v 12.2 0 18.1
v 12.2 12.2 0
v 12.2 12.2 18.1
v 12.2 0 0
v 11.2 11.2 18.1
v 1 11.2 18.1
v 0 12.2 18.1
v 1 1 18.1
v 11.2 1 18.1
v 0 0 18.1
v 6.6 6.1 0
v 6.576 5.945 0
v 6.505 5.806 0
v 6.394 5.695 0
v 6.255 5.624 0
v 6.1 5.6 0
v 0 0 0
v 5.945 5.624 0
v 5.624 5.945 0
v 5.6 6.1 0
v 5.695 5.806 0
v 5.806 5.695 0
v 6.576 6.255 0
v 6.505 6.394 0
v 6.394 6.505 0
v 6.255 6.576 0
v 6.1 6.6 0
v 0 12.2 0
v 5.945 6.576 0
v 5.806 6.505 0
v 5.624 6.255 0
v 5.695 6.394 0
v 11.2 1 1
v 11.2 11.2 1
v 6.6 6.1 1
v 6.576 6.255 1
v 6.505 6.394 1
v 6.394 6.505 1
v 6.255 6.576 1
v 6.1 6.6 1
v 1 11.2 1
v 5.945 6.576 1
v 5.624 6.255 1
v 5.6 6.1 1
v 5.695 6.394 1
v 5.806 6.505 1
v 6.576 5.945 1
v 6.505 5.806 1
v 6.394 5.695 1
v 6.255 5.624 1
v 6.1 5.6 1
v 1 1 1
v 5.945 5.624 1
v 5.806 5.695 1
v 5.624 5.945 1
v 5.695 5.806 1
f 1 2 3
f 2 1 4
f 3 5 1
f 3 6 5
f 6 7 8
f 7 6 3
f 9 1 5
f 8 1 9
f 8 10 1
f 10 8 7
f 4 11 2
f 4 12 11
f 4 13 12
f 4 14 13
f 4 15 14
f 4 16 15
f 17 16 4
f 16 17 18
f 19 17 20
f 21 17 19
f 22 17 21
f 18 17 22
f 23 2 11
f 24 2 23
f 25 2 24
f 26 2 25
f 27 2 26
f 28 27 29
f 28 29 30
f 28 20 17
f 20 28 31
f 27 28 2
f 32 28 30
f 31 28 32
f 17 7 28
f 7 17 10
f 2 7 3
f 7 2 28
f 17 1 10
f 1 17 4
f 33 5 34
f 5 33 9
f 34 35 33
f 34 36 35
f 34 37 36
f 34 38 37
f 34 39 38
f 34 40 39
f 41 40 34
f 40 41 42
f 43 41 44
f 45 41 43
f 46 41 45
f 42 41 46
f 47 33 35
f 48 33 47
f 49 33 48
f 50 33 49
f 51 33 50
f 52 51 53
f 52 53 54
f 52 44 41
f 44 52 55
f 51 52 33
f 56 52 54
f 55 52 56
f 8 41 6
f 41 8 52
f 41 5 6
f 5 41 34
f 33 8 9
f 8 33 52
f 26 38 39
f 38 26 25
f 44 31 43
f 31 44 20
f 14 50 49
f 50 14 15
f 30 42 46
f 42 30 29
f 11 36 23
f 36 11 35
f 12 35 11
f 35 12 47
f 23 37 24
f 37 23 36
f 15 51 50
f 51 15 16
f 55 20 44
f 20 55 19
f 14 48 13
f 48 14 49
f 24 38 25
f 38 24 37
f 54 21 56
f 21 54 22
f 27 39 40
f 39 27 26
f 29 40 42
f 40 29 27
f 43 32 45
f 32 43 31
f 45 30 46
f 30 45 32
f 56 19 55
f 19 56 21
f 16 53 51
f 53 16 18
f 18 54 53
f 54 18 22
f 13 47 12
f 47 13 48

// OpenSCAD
// file: config.scad
$fn = 20;

// Quick-fix for rendering issues on overlapping surfaces
nothing = 0.001;


/*
 * Cuvette parameters (cubic)
 */
cuvette_size_x = 10.0;
cuvette_size_y = 10.0;
cuvette_size_z = 45.0;

// Additional space to leave empty between cuvette and 3d-printed surfaces (holder as well as cap)
cuvette_margin_x = 0.1;
cuvette_margin_y = 0.1;
cuvette_margin_z = 0.1;

/*
 * Box parameters
 */
box_wall_thickness = 2.0;

box_inner_size_x = 39.5;
box_inner_size_y = 37.5;
box_inner_size_z = 26.0;

box_size_x = box_inner_size_x + 2*box_wall_thickness;
box_size_y = box_inner_size_y + 2*box_wall_thickness;
box_size_z = box_inner_size_z + 2*box_wall_thickness;

box_curvature_radius = 2.0;

/*
 * Lid parameters
 */
lid_inset_slider = 1.0;
lid_inset_holder = 2.0;
lid_slider_size_z = 1.0;

/**
 * Cuvette holder parameters
 */
cuvette_holder_wall_thickness = 1.0;

// Distance between inner box wall and holder
cuvette_holder_inset_y = 13.0;

// Distance between inner box wall (bottom) and center of circular openings (on the Y axis)
lightpath_offset_z = 15.0;

lightpath_hole_diameter = 5.0;
lightpath_size_x = 5.0;
lightpath_size_y = 10.0;

/*
 * Cap parameters
 */
cap_hole_diameter = 1.0;
// main file
include <config.scad>;


/**
 * The cap to put on the cuvette to block light from the surrounding environment
 * with a small hole on top to be able to check the light source
 */
module cuvette_cap(
        wall_thickness = cuvette_holder_wall_thickness,
        cuvette_size_x = cuvette_size_x + 2*cuvette_margin_x,
        cuvette_size_y = cuvette_size_y + 2*cuvette_margin_y,
        size_z = cuvette_size_z - box_inner_size_z - box_wall_thickness + cuvette_holder_wall_thickness + cuvette_margin_z,
        hole_diameter = cap_hole_diameter
      )
{
  // Calculate outer cap dimension
	size_x = cuvette_size_x + 2*wall_thickness;
	size_y = cuvette_size_y + 2*wall_thickness;

	difference()
	{
    // A complete cuboid
		cube([size_x, size_y, size_z]);

    // Carve out space for the cuvette
		translate([wall_thickness, wall_thickness, wall_thickness])
		cube([cuvette_size_x, cuvette_size_y, size_z]);

    // Punch a hole in the bottom
    if (hole_diameter > 0.0)
    {
      translate([size_x/2, size_y/2, -nothing])
      cylinder(
          d = hole_diameter,
          h = wall_thickness + 2*nothing
        );
    }
	}
}


// Preview
cuvette_cap();
